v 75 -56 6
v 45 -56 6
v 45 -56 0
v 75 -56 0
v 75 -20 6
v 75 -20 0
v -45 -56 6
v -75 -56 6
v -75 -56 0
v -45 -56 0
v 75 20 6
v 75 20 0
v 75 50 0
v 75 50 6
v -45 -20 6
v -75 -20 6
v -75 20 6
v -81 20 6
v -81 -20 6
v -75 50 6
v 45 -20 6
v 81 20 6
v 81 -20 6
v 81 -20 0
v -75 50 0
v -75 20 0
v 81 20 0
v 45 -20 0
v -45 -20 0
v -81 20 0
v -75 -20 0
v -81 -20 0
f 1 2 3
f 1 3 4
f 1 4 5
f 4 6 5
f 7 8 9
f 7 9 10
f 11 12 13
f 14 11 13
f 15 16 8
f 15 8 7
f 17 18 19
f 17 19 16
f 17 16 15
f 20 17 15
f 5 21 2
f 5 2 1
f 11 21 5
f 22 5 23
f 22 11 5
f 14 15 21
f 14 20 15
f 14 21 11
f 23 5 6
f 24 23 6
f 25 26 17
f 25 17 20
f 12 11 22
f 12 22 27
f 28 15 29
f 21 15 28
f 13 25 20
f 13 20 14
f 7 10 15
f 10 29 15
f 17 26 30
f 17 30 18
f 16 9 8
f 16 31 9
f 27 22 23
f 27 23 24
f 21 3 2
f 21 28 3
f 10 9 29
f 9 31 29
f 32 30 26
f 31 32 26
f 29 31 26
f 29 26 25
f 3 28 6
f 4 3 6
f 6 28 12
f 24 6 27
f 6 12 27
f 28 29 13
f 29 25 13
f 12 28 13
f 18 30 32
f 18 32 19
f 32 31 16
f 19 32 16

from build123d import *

# Parameters (mm, degrees)
ESBO_O1_W                = 150
ESBO_O1_H                = 100
RESSALTO_EXTRUS_O2_DEPTH = 6
ESBO_O3_W                = 90
ESBO_O3_H                = 30
CORTE_EXTRUS_O1_DEPTH    = 91.338253249
ESBO_O4_W                = 6
ESBO_O4_H                = 40
RESSALTO_EXTRUS_O4_DEPTH = 6
ESBO_O5_W                = 6
ESBO_O5_H                = 40
RESSALTO_EXTRUS_O5_DEPTH = 6
ESBO_O7_W                = 30
ESBO_O7_H                = 6
RESSALTO_EXTRUS_O7_DEPTH = 6
ESBO_O8_W                = 30
ESBO_O8_H                = 6
RESSALTO_EXTRUS_O8_DEPTH = 6


with BuildPart() as part:
    # Esboço1 → Ressalto-extrusão2 (new body)
    with BuildSketch(Plane.XY):
        Rectangle(ESBO_O1_W, ESBO_O1_H)
    extrude(amount=RESSALTO_EXTRUS_O2_DEPTH)

    # Esboço3 → Corte-extrusão1 (cut, through all)
    with BuildSketch(Plane.XY.offset(6)):
        with Locations((0, -35)):
            Rectangle(ESBO_O3_W, ESBO_O3_H)
    extrude(amount=-CORTE_EXTRUS_O1_DEPTH, mode=Mode.SUBTRACT)

    # Esboço4 → Ressalto-extrusão4 (add)
    with BuildSketch(Plane(origin=(75, 0, 0), x_dir=(0, 0, -1), z_dir=(1, 0, 0))):
        with Locations((-3, 0)):
            Rectangle(ESBO_O4_W, ESBO_O4_H)
    extrude(amount=RESSALTO_EXTRUS_O4_DEPTH)

    # Esboço5 → Ressalto-extrusão5 (add)
    with BuildSketch(Plane.ZY.offset(75)):
        with Locations((3, 0)):
            Rectangle(ESBO_O5_W, ESBO_O5_H)
    extrude(amount=RESSALTO_EXTRUS_O5_DEPTH)

    # Esboço7 → Ressalto-extrusão7 (add)
    with BuildSketch(Plane.XZ.offset(50)):
        with Locations((60, 3)):
            Rectangle(ESBO_O7_W, ESBO_O7_H)
    extrude(amount=RESSALTO_EXTRUS_O7_DEPTH)

    # Esboço8 → Ressalto-extrusão8 (add)
    with BuildSketch(Plane.XZ.offset(50)):
        with Locations((-60, 3)):
            Rectangle(ESBO_O8_W, ESBO_O8_H)
    extrude(amount=RESSALTO_EXTRUS_O8_DEPTH)


solid = part.part
